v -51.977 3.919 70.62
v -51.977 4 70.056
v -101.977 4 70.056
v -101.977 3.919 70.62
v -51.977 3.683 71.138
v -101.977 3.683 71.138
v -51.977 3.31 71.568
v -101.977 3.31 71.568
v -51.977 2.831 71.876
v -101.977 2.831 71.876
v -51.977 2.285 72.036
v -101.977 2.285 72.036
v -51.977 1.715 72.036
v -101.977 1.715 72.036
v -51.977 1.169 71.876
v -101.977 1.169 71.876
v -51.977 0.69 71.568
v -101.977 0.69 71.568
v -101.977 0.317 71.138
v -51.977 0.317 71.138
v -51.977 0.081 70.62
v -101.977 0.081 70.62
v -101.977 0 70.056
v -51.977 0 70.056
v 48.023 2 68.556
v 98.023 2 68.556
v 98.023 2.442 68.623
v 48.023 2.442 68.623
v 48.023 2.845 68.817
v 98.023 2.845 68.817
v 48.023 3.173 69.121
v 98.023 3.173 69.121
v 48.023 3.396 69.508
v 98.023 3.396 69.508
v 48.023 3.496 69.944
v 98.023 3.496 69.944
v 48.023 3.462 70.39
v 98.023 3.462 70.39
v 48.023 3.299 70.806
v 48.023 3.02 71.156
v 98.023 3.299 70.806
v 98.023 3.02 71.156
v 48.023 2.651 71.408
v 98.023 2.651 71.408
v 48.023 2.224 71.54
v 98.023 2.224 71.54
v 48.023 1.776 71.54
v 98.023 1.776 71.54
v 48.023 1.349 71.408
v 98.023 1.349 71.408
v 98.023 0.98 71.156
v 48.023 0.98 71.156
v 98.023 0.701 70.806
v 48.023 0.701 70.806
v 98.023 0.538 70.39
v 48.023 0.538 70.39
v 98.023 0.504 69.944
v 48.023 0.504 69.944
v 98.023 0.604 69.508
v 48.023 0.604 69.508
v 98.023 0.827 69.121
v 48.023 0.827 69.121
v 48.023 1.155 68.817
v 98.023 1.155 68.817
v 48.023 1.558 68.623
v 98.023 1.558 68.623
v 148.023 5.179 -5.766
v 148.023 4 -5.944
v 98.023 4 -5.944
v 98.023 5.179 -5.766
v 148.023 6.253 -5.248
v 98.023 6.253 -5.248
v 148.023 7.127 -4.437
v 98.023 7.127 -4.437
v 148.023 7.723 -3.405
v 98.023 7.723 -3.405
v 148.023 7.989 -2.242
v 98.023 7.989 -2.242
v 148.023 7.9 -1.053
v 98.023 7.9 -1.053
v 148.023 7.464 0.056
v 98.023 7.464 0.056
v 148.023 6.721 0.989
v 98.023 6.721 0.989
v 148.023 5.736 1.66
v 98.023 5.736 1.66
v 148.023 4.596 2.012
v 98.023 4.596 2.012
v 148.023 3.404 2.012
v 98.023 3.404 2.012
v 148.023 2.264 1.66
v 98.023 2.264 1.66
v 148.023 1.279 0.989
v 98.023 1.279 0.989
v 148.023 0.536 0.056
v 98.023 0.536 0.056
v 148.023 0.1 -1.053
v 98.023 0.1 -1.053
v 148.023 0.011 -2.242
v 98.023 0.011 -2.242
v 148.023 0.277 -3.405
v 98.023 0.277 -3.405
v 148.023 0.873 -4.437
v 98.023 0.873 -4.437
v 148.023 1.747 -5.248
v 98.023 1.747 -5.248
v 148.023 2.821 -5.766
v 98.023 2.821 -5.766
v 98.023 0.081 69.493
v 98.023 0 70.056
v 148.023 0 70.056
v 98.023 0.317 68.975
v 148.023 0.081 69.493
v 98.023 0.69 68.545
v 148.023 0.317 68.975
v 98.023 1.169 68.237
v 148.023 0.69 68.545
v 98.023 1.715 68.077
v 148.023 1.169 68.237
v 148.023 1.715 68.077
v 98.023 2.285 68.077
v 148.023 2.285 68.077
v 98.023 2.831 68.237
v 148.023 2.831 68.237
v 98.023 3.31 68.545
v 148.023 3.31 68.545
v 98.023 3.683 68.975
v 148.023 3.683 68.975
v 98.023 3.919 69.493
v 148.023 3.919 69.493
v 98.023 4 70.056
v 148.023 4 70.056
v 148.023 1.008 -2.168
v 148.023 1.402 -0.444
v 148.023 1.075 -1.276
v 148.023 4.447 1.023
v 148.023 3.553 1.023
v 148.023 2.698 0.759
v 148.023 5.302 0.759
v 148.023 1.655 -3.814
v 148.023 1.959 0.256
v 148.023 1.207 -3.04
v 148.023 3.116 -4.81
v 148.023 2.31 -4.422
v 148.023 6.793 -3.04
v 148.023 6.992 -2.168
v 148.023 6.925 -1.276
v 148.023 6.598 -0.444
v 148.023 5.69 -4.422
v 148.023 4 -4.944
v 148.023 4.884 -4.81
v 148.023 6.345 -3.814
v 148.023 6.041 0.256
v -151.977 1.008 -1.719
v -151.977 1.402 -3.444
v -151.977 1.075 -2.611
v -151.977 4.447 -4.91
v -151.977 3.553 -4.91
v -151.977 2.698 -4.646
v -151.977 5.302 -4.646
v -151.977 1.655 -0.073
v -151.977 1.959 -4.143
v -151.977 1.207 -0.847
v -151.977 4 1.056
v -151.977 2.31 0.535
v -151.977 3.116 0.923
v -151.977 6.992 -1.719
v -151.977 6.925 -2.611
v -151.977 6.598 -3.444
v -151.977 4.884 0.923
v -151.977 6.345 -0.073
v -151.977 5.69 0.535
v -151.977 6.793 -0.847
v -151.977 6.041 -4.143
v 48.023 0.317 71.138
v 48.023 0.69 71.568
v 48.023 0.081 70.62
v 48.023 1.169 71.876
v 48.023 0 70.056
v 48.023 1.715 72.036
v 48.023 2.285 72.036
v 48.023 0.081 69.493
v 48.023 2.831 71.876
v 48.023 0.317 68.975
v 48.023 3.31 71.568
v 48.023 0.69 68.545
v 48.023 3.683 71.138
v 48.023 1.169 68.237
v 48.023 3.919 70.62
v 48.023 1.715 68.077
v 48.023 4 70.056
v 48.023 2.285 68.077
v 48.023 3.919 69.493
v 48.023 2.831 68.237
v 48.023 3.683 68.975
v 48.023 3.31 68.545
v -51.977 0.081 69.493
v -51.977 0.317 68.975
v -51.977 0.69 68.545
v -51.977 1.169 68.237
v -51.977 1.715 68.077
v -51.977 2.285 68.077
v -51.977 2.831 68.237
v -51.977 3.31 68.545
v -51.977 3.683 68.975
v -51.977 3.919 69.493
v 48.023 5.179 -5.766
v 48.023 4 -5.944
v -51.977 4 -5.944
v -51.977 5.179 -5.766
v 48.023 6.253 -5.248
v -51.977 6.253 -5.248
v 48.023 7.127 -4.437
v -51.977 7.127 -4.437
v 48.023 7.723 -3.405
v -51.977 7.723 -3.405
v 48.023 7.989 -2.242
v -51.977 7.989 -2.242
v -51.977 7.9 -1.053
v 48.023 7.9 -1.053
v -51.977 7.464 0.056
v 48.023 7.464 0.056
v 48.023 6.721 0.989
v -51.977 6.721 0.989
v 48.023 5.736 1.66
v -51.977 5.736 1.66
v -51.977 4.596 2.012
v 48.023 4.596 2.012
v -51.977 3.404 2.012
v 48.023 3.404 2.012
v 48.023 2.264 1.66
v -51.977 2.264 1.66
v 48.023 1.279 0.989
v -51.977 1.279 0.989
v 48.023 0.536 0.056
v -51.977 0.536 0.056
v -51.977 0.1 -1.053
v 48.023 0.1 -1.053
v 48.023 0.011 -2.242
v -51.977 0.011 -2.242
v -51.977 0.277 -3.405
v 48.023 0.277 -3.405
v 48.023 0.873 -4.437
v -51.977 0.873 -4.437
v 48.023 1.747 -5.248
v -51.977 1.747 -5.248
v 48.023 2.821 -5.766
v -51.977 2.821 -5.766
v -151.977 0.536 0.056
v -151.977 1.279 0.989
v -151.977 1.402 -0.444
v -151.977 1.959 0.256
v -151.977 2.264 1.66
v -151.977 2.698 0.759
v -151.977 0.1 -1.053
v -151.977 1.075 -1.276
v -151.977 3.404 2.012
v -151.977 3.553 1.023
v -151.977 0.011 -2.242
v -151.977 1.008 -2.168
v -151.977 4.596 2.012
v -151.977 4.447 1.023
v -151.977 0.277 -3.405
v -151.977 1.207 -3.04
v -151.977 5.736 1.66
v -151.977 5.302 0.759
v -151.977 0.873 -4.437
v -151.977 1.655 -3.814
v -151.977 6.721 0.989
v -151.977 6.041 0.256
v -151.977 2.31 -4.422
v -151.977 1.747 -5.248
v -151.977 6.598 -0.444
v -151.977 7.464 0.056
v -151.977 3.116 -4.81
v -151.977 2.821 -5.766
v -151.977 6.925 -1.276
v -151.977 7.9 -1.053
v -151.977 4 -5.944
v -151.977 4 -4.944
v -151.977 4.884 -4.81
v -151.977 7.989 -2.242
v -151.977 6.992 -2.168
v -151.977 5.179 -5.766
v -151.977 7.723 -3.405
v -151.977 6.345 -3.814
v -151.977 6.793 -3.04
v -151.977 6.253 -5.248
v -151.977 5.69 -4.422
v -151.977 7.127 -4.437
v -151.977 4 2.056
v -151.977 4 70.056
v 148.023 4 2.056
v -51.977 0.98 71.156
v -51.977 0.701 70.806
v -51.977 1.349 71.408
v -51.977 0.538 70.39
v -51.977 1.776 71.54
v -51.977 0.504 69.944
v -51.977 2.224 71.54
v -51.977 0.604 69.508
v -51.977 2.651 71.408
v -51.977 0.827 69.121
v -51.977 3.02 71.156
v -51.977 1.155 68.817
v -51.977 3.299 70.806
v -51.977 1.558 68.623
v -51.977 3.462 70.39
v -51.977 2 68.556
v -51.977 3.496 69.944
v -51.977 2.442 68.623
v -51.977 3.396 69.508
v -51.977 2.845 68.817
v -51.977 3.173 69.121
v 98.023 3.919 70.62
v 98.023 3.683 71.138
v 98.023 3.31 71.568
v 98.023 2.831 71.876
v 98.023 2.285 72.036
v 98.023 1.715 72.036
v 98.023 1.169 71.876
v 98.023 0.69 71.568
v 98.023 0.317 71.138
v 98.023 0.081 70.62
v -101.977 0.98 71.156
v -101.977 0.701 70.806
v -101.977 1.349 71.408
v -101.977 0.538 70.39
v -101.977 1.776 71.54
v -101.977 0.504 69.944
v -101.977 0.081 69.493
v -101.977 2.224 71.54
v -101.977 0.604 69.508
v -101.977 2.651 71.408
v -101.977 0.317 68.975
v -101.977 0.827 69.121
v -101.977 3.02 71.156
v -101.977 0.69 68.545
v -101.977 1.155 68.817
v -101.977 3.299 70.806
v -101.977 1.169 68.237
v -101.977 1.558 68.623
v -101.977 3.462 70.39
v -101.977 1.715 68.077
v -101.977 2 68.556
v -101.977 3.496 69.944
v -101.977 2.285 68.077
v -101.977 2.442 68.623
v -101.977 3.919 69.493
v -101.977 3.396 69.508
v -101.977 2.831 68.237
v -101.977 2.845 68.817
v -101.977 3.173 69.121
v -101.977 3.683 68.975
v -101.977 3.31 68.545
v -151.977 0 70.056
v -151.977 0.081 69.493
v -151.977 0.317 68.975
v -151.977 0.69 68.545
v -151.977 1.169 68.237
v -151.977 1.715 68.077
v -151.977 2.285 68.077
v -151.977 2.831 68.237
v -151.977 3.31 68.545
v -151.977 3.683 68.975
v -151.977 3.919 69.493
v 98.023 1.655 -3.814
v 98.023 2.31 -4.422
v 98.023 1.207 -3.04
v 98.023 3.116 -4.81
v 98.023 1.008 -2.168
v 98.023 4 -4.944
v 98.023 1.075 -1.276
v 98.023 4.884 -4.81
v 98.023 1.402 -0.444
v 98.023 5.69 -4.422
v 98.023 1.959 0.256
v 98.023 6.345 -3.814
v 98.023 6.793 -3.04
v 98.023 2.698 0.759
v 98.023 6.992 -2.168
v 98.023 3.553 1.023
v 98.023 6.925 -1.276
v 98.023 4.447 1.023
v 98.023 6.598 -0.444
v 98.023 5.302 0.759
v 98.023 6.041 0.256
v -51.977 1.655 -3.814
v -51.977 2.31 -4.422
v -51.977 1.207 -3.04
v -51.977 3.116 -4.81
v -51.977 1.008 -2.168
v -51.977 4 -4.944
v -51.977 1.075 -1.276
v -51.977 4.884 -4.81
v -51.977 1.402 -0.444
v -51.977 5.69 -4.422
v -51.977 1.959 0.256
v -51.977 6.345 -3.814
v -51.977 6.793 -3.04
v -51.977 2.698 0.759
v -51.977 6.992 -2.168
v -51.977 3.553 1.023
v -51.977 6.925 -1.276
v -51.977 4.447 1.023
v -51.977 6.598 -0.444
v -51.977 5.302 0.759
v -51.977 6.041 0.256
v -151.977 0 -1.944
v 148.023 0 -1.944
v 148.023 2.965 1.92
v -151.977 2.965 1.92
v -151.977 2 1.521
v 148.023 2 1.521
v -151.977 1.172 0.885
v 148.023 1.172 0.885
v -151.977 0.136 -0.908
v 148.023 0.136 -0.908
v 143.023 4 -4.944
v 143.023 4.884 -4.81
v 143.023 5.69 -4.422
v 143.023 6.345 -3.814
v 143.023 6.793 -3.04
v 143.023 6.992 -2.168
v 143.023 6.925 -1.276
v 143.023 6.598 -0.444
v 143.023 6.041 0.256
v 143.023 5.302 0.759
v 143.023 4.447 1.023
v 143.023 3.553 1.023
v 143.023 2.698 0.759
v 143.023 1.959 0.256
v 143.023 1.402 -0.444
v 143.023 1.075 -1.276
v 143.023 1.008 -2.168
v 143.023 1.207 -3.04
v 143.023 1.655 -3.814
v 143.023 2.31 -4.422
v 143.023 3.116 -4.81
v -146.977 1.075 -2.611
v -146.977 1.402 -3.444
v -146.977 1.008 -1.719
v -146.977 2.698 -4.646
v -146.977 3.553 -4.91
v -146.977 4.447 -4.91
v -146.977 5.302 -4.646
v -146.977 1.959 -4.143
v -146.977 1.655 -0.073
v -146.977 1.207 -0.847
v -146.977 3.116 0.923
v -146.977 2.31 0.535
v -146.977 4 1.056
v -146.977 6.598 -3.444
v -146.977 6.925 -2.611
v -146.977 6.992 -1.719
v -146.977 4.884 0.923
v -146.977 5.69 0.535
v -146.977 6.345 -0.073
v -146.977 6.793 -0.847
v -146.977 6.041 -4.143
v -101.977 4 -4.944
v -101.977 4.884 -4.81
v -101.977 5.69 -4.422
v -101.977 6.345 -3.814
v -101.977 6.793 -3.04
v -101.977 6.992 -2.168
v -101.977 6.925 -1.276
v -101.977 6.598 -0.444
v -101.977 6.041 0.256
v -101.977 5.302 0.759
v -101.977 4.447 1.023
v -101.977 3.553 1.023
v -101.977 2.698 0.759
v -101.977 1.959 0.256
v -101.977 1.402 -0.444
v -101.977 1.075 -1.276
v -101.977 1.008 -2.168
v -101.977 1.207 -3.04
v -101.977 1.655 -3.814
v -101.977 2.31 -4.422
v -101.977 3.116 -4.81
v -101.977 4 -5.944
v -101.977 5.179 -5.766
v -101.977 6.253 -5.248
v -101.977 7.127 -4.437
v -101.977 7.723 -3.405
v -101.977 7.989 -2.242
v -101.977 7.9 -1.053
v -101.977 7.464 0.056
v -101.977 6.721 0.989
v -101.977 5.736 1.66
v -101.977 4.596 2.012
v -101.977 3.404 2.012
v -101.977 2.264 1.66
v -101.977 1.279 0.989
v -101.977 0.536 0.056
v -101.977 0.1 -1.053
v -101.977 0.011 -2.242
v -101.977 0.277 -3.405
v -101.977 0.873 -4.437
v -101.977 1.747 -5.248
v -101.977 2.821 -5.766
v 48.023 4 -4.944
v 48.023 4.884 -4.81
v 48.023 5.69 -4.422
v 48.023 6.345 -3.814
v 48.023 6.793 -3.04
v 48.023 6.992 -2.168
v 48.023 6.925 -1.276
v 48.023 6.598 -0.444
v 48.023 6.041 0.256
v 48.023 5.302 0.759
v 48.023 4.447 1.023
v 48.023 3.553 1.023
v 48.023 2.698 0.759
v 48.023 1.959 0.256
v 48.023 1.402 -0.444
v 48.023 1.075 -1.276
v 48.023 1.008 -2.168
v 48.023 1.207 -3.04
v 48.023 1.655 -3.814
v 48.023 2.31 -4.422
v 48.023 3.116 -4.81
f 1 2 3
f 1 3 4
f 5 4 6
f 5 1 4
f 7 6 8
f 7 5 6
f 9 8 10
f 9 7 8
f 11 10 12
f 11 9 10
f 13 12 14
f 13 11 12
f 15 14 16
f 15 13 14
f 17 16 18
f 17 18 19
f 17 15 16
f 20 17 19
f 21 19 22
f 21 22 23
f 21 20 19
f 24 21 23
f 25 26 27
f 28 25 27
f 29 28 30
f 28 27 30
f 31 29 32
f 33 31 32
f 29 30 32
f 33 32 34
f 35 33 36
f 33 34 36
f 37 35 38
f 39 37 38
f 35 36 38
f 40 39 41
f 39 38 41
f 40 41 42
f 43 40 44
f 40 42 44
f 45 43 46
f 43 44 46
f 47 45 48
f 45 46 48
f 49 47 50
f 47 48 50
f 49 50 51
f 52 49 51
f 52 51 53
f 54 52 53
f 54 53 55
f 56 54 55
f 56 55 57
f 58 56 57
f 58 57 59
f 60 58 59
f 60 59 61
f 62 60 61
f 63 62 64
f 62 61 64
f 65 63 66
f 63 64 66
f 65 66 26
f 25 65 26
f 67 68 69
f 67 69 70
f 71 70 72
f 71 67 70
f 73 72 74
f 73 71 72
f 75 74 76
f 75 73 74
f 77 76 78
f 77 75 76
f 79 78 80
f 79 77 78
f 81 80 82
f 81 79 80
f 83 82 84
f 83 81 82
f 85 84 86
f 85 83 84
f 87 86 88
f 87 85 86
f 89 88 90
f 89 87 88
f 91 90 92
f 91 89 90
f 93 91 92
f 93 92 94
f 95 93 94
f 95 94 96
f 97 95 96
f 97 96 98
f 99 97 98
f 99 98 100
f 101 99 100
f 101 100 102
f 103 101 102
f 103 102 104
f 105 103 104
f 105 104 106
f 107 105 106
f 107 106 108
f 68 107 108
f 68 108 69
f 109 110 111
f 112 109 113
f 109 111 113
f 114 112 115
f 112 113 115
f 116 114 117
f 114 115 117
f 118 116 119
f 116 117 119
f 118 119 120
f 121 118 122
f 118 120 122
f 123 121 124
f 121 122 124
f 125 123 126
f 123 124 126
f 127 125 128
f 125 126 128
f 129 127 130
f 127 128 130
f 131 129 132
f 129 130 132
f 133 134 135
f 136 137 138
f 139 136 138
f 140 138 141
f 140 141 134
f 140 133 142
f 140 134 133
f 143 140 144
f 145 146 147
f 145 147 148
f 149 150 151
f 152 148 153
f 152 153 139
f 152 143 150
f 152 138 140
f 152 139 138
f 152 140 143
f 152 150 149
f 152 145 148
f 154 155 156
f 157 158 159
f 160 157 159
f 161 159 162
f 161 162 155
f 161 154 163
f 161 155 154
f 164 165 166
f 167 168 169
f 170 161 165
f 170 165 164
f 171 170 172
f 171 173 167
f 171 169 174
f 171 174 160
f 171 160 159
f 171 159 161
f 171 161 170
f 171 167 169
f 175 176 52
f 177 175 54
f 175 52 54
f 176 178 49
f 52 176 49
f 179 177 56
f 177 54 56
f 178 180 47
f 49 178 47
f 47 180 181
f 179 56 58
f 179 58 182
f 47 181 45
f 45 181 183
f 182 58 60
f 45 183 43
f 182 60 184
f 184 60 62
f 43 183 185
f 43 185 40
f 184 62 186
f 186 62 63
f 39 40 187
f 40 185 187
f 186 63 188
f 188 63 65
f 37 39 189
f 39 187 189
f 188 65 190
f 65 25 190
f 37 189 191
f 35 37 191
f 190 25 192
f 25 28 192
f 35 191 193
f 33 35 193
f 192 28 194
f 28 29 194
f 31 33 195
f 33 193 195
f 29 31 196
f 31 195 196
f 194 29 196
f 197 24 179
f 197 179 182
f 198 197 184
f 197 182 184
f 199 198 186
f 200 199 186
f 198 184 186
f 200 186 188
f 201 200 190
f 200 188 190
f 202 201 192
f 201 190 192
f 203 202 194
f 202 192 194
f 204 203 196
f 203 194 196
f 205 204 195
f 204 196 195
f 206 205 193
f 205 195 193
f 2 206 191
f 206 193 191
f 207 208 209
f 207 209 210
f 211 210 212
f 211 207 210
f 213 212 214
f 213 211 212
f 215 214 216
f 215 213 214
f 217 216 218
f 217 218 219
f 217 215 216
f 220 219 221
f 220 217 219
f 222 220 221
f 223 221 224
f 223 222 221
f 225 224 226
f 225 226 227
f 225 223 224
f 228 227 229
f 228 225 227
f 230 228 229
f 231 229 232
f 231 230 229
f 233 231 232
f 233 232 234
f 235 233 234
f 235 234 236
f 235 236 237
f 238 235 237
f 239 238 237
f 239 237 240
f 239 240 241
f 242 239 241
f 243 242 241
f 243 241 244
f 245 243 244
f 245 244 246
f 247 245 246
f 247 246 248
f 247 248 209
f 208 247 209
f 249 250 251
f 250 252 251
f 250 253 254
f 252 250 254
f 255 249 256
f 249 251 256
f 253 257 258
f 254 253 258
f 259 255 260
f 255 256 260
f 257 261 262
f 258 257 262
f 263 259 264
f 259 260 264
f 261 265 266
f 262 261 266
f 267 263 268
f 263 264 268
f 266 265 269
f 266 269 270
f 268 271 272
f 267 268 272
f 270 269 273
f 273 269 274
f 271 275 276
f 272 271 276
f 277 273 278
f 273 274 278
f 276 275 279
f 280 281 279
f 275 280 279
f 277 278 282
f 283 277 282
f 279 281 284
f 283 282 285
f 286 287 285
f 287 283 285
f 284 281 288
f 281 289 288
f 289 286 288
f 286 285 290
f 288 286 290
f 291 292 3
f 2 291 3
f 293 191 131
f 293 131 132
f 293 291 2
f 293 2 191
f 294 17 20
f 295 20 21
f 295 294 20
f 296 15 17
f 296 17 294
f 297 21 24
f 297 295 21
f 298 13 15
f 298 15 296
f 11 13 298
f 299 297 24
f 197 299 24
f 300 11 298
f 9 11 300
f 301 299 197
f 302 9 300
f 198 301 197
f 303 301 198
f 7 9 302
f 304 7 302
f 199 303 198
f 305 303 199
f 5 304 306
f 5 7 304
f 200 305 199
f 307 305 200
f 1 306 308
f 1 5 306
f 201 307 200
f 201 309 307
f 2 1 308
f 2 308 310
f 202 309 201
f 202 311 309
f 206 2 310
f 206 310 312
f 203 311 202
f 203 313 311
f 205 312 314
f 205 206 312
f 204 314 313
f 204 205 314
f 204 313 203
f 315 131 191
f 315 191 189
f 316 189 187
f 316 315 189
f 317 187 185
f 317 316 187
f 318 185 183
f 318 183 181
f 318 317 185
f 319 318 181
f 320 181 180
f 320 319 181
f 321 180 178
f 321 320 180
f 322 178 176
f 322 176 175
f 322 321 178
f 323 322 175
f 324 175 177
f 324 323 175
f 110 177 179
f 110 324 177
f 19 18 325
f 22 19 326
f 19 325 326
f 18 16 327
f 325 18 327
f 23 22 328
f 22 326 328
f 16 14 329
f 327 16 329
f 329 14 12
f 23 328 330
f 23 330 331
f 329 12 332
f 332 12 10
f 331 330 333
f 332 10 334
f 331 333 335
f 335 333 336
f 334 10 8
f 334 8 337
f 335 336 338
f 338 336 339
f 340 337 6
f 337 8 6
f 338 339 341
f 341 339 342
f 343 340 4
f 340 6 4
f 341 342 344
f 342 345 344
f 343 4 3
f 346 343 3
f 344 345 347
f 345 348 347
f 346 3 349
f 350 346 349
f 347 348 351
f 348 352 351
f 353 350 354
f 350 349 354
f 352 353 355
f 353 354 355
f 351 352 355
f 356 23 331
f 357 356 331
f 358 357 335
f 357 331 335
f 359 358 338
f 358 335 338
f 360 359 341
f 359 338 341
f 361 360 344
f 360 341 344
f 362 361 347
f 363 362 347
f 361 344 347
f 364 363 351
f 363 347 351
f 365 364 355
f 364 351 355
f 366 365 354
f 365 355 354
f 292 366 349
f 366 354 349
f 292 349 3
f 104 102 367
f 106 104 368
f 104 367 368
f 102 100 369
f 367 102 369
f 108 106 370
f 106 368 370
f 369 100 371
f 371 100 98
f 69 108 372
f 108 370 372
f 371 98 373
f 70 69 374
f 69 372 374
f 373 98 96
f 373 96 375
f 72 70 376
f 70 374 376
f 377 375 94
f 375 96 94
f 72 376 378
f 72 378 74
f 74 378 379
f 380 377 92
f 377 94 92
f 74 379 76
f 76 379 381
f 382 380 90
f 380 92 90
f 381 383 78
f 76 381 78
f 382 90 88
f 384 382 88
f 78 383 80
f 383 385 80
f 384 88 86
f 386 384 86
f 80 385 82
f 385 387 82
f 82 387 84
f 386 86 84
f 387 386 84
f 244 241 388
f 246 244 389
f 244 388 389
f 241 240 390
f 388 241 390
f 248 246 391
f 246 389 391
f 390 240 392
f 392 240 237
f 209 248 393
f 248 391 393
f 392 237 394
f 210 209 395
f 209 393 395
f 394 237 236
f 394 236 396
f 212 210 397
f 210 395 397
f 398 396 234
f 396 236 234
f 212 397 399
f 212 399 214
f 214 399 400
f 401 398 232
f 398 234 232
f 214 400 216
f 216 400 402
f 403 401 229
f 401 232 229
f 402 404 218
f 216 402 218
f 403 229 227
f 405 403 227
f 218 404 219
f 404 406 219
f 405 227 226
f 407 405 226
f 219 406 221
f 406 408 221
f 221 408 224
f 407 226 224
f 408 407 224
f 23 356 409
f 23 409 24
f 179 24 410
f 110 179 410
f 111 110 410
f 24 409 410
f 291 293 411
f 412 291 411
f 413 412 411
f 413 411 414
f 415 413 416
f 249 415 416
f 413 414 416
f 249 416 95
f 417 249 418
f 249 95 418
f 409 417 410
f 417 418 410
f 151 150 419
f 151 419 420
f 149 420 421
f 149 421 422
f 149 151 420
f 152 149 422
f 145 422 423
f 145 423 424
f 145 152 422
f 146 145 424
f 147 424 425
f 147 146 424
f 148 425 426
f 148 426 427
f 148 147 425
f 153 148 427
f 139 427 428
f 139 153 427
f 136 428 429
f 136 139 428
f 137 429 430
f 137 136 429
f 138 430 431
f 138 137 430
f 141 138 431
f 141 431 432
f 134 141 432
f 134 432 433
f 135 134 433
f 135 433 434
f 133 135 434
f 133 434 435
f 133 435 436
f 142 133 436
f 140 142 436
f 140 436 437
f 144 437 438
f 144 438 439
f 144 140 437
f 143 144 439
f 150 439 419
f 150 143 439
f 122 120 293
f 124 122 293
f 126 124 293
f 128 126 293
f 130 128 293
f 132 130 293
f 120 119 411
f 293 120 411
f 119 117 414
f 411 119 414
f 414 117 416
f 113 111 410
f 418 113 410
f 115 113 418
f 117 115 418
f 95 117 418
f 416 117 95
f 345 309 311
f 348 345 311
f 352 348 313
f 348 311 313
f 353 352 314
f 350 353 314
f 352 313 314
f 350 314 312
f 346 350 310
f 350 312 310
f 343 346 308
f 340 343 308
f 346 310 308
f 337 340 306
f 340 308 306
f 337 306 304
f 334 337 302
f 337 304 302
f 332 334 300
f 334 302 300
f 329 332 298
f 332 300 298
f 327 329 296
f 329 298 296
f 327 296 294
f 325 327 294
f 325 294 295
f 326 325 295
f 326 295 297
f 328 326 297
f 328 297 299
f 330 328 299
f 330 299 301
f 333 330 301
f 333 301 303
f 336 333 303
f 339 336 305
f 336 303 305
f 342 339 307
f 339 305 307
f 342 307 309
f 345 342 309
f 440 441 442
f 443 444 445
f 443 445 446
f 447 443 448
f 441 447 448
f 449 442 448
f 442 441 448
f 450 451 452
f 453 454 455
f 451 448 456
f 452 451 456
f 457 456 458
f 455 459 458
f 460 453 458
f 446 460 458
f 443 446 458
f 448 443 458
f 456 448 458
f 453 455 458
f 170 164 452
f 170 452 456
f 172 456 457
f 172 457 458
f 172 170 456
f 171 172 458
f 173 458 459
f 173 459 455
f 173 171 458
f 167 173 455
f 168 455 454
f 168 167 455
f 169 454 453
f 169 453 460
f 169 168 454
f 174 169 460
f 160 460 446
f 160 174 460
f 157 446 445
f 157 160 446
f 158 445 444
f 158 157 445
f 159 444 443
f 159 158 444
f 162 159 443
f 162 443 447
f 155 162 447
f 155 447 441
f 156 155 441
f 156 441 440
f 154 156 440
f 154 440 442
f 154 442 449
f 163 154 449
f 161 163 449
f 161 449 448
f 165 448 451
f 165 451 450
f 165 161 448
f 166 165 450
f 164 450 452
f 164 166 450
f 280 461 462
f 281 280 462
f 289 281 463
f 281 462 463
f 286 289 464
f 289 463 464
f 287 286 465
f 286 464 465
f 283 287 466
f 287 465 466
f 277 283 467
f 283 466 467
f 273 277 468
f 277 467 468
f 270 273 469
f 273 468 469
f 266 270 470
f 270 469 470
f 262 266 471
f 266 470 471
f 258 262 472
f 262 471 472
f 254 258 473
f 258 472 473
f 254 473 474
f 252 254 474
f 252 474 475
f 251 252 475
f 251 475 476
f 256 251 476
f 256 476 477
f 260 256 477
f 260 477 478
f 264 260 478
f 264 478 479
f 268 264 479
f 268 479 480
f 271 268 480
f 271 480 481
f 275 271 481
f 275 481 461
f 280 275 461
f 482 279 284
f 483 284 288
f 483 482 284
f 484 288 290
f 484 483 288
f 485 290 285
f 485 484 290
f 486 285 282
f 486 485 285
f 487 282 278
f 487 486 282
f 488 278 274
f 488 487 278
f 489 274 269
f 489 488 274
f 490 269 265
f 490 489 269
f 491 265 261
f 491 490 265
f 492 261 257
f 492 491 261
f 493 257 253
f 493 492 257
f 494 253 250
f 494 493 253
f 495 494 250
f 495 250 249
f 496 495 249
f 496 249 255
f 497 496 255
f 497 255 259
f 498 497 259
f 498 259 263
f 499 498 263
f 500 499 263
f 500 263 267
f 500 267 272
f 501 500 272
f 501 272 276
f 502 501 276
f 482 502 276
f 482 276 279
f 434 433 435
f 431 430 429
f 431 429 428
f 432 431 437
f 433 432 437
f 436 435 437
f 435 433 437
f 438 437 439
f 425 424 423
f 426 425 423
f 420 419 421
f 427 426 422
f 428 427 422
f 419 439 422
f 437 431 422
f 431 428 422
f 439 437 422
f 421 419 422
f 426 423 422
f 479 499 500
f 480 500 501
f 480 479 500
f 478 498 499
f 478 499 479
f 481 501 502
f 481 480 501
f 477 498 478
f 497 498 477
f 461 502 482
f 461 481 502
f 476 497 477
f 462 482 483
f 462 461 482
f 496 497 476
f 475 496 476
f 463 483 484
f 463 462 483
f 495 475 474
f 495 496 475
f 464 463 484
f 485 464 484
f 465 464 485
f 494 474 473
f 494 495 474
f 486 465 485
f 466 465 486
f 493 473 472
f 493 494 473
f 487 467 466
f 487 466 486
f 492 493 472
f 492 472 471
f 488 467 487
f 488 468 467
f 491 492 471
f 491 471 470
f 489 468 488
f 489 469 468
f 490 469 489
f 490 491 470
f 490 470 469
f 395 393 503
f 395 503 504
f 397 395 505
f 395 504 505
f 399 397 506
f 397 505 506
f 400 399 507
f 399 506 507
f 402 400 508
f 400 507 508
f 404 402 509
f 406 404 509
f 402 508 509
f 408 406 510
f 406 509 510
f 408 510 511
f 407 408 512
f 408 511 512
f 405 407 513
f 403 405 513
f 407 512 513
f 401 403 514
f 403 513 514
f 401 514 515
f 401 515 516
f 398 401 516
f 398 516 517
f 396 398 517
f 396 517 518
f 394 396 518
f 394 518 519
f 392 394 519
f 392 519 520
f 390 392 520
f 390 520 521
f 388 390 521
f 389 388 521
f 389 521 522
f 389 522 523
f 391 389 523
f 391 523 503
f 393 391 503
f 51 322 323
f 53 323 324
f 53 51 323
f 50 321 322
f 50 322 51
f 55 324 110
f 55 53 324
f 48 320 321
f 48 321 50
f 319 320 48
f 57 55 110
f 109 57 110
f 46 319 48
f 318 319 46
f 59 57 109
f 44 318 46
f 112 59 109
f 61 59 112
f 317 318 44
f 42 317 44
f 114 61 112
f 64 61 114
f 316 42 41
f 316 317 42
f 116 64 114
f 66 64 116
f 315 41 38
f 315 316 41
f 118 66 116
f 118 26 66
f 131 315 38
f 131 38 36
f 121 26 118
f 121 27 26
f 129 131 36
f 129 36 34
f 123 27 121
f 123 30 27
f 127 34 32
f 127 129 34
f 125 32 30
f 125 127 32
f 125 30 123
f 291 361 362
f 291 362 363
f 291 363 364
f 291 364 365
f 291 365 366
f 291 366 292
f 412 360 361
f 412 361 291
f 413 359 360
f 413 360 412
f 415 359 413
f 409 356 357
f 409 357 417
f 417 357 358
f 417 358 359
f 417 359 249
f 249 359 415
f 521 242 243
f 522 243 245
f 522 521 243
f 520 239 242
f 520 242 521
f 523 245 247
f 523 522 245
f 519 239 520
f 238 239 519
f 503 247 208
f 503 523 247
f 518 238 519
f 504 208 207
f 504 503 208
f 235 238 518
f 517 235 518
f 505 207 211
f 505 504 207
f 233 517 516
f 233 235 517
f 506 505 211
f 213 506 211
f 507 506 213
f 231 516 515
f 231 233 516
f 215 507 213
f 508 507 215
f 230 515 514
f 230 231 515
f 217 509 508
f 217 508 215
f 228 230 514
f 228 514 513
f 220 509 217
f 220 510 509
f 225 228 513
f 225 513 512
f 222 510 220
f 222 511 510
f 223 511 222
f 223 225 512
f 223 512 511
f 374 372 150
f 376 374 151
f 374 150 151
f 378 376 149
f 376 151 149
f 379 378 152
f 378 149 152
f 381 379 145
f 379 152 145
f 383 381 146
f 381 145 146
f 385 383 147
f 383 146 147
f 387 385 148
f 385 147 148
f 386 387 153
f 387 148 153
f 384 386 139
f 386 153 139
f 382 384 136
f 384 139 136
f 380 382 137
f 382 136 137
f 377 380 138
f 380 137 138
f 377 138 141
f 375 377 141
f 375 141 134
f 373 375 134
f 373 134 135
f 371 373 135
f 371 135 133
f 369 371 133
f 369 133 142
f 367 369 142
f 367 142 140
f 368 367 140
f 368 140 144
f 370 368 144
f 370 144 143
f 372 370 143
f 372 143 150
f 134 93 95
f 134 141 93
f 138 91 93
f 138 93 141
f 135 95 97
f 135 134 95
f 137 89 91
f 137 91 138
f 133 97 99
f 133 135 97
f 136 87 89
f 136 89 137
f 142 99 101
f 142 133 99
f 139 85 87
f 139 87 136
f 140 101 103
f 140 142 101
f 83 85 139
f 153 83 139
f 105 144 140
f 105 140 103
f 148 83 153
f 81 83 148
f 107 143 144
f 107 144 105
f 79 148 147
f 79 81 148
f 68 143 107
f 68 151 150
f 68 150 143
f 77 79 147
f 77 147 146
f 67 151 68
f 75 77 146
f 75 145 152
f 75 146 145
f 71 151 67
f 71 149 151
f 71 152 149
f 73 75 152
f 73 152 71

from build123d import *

# Parameters (mm, degrees)
SKETCH_1_W                   = 300
SKETCH_1_H                   = 72
EXTRUDE_1_DEPTH              = 4
SKETCH_2_R                   = 4
CUT_EXTRUDE_1_DEPTH          = 300
SKETCH_3_R                   = 4
SKETCH_3_R_2                 = 3
EXTRUDE_1_2_DEPTH            = 300
SKETCH_5_R                   = 3
EXTRUDE_2_DEPTH              = 5
SKETCH_6_R                   = 3
EXTRUDE_3_DEPTH              = 5
SPLIT_START                  = -101.97740113
SPLIT_BODIES_1_OUTLINE_R     = 4
SPLIT_BODIES_1_OUTLINE_R_2   = 3
SPLIT_BODIES_1_DEPTH         = 50
SPLIT_START_2                = 48.02259887
SPLIT_BODIES_1_2_OUTLINE_R   = 4
SPLIT_BODIES_1_2_OUTLINE_R_2 = 3
SPLIT_BODIES_1_2_DEPTH       = 50
SKETCH_7_R                   = 2
CUT_EXTRUDE_2_DEPTH          = 309.175133319
EXTRUDE_START                = 50
SKETCH_8_R                   = 2
SKETCH_8_R_2                 = 1.5
EXTRUDE_3_2_DEPTH            = 50
SKETCH_10_R                  = 2
SKETCH_10_R_2                = 1.5
EXTRUDE_4_DEPTH              = 50


# Read off the part's stored shape, not the designer's step: 分割1
with BuildPart() as part:
    # 草图1 → Extrude 1 (new body)
    with BuildSketch(Plane(origin=(0, 0, 0), x_dir=(1, 0, 0), z_dir=(0, 1, 0))):
        with Locations((-1.97740113, -34.056497175)):
            Rectangle(SKETCH_1_W, SKETCH_1_H)
    extrude(amount=EXTRUDE_1_DEPTH)

    # 草图2 → 切除-拉伸1 (cut)
    with BuildSketch(Plane(origin=(148.02259887, 0, 0), x_dir=(0, 0, -1), z_dir=(1, 0, 0))):
        with Locations((1.943502825, 4)):
            Circle(SKETCH_2_R)
    extrude(amount=-CUT_EXTRUDE_1_DEPTH, mode=Mode.SUBTRACT)

    # 草图7 → 切除-拉伸2 (cut, through all)
    with BuildSketch(Plane(origin=(148.02259887, 0, 0), x_dir=(0, 0, -1), z_dir=(1, 0, 0))):
        with Locations((-70.056497175, 2)):
            Circle(SKETCH_7_R)
    extrude(amount=-CUT_EXTRUDE_2_DEPTH, mode=Mode.SUBTRACT)

    # 草图8 → Extrude 3 2 (add)
    with BuildSketch(Plane(origin=(-101.97740113, 0, 0), x_dir=(0, 0, -1), z_dir=(1, 0, 0)).offset(EXTRUDE_START)):
        with Locations((-70.056497175, 2)):
            Circle(SKETCH_8_R)
        with Locations((-70.056497175, 2)):
            Circle(SKETCH_8_R_2, mode=Mode.SUBTRACT)
    extrude(amount=-EXTRUDE_3_2_DEPTH)

    # 草图10 → 拉伸-薄壁4 (add)
    with BuildSketch(Plane(origin=(98.02259887, 0, 0), x_dir=(0, 0, -1), z_dir=(1, 0, 0))):
        with Locations((-70.056497175, 2)):
            Circle(SKETCH_10_R)
        with Locations((-70.056497175, 2)):
            Circle(SKETCH_10_R_2, mode=Mode.SUBTRACT)
    extrude(amount=-EXTRUDE_4_DEPTH)


with BuildPart() as body_2:
    # 草图3 → Extrude 1 2 (new body)
    with BuildSketch(Plane(origin=(148.02259887, 0, 0), x_dir=(0, 0, -1), z_dir=(1, 0, 0))):
        with Locations((1.943502825, 4)):
            Circle(SKETCH_3_R)
        with Locations((1.943502825, 4)):
            Circle(SKETCH_3_R_2, mode=Mode.SUBTRACT)
    extrude(amount=-EXTRUDE_1_2_DEPTH)

    # Split Bodies 1 outline → Split Bodies 1 (cut)
    with BuildSketch(Plane.YZ.offset(SPLIT_START)):
        with Locations((4, -1.943502825)):
            Circle(SPLIT_BODIES_1_OUTLINE_R)
        with Locations((4, -1.943502825)):
            Circle(SPLIT_BODIES_1_OUTLINE_R_2, mode=Mode.SUBTRACT)
    extrude(amount=SPLIT_BODIES_1_DEPTH, mode=Mode.SUBTRACT)

    # Split Bodies 1 2 outline → Split Bodies 1 2 (cut)
    with BuildSketch(Plane.YZ.offset(SPLIT_START_2)):
        with Locations((4, -1.943502825)):
            Circle(SPLIT_BODIES_1_2_OUTLINE_R)
        with Locations((4, -1.943502825)):
            Circle(SPLIT_BODIES_1_2_OUTLINE_R_2, mode=Mode.SUBTRACT)
    extrude(amount=SPLIT_BODIES_1_2_DEPTH, mode=Mode.SUBTRACT)


with BuildPart() as body_3:
    # 草图5 → 凸台-拉伸2 (new body)
    with BuildSketch(Plane(origin=(148.02259887, 0, 0), x_dir=(0, 0, -1), z_dir=(1, 0, 0))):
        with Locations((1.943502825, 4)):
            Circle(SKETCH_5_R)
    extrude(amount=-EXTRUDE_2_DEPTH)


with BuildPart() as body_4:
    # 草图6 → Extrude 3 (new body)
    with BuildSketch(Plane.ZY.offset(151.97740113)):
        with Locations((-1.943502825, 4)):
            Circle(SKETCH_6_R)
    extrude(amount=-EXTRUDE_3_DEPTH)


solid = Compound([part.part, body_2.part, body_3.part, body_4.part])
